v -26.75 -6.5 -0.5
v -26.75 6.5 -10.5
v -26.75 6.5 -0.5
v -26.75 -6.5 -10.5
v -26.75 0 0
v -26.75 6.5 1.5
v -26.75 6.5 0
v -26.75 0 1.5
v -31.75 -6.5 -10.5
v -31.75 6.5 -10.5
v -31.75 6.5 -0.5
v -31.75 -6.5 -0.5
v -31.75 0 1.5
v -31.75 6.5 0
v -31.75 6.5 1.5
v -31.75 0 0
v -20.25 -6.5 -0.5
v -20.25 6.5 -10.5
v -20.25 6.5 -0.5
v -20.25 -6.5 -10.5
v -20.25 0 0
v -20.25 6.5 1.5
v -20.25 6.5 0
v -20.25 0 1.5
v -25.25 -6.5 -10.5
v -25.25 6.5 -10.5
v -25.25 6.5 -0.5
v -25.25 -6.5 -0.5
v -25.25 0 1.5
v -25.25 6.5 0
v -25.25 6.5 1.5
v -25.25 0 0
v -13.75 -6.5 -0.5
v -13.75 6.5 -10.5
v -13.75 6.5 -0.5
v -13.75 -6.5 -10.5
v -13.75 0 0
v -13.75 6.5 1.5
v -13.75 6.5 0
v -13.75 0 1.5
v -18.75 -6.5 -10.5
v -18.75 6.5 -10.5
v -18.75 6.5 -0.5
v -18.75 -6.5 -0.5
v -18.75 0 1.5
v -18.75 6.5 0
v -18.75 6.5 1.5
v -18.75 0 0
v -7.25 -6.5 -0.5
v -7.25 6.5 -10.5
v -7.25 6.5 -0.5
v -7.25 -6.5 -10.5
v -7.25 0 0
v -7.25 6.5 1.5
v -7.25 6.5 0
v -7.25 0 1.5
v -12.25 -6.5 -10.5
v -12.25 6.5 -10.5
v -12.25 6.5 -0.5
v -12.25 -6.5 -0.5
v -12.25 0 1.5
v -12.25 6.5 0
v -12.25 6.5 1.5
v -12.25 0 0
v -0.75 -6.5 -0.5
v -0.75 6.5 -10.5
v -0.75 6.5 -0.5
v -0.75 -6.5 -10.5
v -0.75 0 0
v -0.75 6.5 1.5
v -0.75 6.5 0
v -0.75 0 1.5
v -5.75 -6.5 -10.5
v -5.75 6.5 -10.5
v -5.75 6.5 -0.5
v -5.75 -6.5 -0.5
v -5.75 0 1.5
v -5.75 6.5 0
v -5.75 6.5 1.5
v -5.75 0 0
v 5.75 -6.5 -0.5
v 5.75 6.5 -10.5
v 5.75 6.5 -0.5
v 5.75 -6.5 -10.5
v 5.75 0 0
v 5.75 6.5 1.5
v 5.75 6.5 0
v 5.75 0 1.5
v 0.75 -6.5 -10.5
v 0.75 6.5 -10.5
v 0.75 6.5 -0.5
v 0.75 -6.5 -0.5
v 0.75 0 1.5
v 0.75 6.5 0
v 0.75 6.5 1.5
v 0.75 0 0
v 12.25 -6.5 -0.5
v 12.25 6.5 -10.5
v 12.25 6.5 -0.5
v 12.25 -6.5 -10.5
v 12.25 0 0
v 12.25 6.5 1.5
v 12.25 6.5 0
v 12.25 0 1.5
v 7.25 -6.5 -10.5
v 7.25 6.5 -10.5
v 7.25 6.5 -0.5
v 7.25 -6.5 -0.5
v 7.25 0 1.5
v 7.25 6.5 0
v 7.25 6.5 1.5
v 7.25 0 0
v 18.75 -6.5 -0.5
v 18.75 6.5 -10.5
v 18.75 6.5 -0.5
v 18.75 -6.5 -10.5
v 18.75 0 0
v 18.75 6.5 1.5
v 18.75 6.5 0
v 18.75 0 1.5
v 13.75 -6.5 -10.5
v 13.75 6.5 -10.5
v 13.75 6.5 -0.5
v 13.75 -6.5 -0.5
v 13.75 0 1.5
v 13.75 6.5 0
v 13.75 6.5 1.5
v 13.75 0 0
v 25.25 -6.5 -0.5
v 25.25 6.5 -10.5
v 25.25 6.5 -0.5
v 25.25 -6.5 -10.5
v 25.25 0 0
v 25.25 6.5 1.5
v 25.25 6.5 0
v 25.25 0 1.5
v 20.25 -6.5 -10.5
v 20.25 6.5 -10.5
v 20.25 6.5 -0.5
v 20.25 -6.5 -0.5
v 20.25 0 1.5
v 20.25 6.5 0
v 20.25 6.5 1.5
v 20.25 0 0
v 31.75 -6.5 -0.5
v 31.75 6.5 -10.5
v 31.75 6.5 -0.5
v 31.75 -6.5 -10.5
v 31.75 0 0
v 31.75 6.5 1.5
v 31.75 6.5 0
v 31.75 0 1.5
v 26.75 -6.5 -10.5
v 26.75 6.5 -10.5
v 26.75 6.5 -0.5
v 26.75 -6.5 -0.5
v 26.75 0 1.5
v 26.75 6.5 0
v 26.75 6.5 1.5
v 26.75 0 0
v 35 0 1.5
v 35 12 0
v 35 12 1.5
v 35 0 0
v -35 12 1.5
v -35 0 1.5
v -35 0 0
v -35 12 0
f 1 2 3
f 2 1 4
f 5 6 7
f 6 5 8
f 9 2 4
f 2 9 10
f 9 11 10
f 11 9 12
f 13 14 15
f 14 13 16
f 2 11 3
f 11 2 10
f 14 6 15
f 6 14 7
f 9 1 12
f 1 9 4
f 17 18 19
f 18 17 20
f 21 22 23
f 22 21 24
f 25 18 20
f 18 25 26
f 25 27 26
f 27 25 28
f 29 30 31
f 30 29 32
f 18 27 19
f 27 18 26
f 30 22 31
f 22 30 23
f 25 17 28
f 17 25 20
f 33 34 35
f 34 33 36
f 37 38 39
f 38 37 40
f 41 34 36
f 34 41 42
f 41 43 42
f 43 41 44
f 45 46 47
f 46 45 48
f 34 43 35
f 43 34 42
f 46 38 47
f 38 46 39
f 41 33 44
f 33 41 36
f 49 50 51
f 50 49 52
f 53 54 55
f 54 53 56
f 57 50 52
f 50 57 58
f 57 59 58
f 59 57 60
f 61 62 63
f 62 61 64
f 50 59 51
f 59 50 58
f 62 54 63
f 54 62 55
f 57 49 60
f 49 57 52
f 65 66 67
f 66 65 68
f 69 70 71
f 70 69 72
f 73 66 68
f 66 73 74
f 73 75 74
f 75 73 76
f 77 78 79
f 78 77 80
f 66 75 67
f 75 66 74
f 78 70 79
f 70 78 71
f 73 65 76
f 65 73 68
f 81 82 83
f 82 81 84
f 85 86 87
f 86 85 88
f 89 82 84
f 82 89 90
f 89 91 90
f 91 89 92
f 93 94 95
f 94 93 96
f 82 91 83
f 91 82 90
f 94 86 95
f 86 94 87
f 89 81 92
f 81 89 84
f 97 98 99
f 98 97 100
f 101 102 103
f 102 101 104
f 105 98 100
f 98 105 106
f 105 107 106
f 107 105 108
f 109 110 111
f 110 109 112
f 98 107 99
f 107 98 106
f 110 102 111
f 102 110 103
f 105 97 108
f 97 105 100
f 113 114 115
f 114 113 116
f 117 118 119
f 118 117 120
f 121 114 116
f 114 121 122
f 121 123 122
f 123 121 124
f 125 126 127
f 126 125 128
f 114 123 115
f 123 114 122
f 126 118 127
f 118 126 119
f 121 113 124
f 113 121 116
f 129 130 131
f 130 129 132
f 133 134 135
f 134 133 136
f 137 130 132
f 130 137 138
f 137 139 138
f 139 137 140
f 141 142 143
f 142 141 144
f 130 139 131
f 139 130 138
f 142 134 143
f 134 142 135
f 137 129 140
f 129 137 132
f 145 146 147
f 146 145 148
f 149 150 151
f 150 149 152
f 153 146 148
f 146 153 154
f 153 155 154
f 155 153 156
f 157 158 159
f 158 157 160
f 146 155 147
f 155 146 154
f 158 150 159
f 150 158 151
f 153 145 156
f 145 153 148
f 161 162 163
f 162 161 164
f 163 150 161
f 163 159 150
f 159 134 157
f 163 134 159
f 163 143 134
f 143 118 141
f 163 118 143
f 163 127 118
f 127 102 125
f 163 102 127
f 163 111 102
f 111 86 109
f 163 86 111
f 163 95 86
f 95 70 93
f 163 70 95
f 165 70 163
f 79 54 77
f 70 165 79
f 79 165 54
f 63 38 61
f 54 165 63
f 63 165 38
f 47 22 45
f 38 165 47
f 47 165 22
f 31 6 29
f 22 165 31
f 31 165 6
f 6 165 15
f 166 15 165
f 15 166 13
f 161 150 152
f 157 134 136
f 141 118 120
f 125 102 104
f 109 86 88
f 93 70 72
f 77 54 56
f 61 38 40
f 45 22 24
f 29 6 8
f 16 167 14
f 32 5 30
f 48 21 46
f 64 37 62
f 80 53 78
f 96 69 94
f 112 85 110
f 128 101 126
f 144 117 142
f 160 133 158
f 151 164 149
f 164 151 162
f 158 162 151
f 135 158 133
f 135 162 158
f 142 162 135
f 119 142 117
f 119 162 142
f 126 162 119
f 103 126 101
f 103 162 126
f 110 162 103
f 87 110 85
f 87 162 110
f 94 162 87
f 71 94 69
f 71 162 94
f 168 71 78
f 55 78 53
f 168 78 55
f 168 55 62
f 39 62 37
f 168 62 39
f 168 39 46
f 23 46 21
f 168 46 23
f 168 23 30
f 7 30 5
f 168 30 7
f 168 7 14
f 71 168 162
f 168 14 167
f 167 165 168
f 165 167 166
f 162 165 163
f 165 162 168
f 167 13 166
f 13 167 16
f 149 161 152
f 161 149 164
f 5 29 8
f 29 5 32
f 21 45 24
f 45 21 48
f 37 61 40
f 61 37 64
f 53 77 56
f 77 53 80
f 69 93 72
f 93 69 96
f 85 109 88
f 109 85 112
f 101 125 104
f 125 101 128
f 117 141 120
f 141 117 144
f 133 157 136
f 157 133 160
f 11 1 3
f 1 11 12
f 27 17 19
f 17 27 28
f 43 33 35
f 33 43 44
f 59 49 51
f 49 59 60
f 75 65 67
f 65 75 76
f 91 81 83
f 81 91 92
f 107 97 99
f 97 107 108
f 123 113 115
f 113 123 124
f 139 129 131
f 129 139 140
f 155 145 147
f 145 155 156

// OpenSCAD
// 10-well comb for casting agarose gels
// Print orientation: flat on bed, teeth pointing down (-Y)

// ---------- Parameters ----------
plate_t      = 1.5;    // plate thickness (Z)
spine_l      = 70;     // spine length (X)
spine_w      = 12;     // spine width (Y)
tooth_n      = 10;     // number of teeth
tooth_w      = 5.0;    // tooth width (X)
tooth_l      = 12;     // tooth length (Y)
tooth_h      = 12;     // tooth height from top of plate (Z)
gap          = 1.5;    // gap between neighbouring teeth (X)
eps          = 0.5;    // cutter overshoot past faces

$fn = 64;

// ---------- Derived ----------
pitch   = tooth_w + gap;                 // centre-to-centre spacing
x_start = -(tooth_n - 1) * pitch / 2;    // first tooth centre (row centred)

// ---------- Model ----------
difference() {
    union() {
        // Spine (back bar)
        translate([-spine_l / 2, 0, 0])
            cube([spine_l, spine_w, plate_t]);

        // Teeth
        for (i = [0 : tooth_n - 1])
            translate([x_start + i * pitch - tooth_w / 2,
                       -spine_w / 2 - eps,
                       plate_t - tooth_h])
                cube([tooth_w, tooth_l + 2 * eps, tooth_h + eps]);
    }

    // Pockets for the wells (through the plate)
    for (i = [0 : tooth_n - 1])
        translate([x_start + i * pitch - tooth_w / 2,
                   -spine_w / 2 - eps,
                   -eps])
            cube([tooth_w, tooth_l + 2 * eps, plate_t + 2 * eps]);
}
